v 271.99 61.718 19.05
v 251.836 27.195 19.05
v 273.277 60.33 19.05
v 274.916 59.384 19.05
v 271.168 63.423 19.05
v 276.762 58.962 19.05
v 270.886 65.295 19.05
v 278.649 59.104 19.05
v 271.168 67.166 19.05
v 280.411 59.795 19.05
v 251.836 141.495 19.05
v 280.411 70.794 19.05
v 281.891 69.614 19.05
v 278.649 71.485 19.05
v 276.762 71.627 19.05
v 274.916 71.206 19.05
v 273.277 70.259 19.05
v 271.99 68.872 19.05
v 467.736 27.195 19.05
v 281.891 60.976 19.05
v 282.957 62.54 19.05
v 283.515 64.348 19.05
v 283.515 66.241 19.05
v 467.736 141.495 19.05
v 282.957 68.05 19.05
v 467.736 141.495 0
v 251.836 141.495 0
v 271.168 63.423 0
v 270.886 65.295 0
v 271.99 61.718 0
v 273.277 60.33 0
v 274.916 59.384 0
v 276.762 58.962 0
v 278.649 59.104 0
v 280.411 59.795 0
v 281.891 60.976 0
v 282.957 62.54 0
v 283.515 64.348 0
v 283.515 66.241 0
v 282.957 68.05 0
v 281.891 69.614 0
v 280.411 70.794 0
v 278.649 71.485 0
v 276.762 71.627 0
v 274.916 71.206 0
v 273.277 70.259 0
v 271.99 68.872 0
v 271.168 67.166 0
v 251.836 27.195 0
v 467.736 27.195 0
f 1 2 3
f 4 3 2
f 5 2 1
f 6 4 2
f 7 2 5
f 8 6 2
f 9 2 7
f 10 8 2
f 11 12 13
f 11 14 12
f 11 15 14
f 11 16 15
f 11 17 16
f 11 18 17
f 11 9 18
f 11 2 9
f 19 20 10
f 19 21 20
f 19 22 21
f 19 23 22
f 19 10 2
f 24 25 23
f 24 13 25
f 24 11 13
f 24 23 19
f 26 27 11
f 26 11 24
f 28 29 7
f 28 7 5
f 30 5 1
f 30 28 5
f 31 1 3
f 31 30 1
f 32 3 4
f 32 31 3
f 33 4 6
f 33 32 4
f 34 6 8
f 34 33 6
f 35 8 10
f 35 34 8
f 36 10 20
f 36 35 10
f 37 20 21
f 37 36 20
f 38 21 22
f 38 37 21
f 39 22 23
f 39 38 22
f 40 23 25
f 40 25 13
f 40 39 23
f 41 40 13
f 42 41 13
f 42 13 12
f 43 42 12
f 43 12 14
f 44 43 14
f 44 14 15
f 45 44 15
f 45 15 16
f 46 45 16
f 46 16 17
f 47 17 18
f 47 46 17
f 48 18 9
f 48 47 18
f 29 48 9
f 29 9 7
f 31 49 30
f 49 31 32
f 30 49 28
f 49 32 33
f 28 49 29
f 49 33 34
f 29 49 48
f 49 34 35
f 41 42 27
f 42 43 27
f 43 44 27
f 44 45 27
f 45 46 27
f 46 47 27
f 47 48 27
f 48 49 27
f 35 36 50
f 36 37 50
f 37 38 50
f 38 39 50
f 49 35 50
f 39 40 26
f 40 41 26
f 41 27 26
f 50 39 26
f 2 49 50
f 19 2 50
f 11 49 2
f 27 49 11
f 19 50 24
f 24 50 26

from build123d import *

# Parameters (mm, degrees)
SKETCH2_W           = 215.9
SKETCH2_H           = 114.3
SKETCH2_R           = 6.35
BOSS_EXTRUDE1_DEPTH = 19.05


with BuildPart() as part:
    # Sketch2 → Boss-Extrude1 (new body)
    with BuildSketch(Plane.XY):
        with Locations((359.786295427, 84.34467147)):
            Rectangle(SKETCH2_W, SKETCH2_H)
        with Locations(Location((277.236295427, 65.29467147, 0), (0, 0, 180))):
            Circle(SKETCH2_R, mode=Mode.SUBTRACT)
    extrude(amount=BOSS_EXTRUDE1_DEPTH)


solid = part.part
